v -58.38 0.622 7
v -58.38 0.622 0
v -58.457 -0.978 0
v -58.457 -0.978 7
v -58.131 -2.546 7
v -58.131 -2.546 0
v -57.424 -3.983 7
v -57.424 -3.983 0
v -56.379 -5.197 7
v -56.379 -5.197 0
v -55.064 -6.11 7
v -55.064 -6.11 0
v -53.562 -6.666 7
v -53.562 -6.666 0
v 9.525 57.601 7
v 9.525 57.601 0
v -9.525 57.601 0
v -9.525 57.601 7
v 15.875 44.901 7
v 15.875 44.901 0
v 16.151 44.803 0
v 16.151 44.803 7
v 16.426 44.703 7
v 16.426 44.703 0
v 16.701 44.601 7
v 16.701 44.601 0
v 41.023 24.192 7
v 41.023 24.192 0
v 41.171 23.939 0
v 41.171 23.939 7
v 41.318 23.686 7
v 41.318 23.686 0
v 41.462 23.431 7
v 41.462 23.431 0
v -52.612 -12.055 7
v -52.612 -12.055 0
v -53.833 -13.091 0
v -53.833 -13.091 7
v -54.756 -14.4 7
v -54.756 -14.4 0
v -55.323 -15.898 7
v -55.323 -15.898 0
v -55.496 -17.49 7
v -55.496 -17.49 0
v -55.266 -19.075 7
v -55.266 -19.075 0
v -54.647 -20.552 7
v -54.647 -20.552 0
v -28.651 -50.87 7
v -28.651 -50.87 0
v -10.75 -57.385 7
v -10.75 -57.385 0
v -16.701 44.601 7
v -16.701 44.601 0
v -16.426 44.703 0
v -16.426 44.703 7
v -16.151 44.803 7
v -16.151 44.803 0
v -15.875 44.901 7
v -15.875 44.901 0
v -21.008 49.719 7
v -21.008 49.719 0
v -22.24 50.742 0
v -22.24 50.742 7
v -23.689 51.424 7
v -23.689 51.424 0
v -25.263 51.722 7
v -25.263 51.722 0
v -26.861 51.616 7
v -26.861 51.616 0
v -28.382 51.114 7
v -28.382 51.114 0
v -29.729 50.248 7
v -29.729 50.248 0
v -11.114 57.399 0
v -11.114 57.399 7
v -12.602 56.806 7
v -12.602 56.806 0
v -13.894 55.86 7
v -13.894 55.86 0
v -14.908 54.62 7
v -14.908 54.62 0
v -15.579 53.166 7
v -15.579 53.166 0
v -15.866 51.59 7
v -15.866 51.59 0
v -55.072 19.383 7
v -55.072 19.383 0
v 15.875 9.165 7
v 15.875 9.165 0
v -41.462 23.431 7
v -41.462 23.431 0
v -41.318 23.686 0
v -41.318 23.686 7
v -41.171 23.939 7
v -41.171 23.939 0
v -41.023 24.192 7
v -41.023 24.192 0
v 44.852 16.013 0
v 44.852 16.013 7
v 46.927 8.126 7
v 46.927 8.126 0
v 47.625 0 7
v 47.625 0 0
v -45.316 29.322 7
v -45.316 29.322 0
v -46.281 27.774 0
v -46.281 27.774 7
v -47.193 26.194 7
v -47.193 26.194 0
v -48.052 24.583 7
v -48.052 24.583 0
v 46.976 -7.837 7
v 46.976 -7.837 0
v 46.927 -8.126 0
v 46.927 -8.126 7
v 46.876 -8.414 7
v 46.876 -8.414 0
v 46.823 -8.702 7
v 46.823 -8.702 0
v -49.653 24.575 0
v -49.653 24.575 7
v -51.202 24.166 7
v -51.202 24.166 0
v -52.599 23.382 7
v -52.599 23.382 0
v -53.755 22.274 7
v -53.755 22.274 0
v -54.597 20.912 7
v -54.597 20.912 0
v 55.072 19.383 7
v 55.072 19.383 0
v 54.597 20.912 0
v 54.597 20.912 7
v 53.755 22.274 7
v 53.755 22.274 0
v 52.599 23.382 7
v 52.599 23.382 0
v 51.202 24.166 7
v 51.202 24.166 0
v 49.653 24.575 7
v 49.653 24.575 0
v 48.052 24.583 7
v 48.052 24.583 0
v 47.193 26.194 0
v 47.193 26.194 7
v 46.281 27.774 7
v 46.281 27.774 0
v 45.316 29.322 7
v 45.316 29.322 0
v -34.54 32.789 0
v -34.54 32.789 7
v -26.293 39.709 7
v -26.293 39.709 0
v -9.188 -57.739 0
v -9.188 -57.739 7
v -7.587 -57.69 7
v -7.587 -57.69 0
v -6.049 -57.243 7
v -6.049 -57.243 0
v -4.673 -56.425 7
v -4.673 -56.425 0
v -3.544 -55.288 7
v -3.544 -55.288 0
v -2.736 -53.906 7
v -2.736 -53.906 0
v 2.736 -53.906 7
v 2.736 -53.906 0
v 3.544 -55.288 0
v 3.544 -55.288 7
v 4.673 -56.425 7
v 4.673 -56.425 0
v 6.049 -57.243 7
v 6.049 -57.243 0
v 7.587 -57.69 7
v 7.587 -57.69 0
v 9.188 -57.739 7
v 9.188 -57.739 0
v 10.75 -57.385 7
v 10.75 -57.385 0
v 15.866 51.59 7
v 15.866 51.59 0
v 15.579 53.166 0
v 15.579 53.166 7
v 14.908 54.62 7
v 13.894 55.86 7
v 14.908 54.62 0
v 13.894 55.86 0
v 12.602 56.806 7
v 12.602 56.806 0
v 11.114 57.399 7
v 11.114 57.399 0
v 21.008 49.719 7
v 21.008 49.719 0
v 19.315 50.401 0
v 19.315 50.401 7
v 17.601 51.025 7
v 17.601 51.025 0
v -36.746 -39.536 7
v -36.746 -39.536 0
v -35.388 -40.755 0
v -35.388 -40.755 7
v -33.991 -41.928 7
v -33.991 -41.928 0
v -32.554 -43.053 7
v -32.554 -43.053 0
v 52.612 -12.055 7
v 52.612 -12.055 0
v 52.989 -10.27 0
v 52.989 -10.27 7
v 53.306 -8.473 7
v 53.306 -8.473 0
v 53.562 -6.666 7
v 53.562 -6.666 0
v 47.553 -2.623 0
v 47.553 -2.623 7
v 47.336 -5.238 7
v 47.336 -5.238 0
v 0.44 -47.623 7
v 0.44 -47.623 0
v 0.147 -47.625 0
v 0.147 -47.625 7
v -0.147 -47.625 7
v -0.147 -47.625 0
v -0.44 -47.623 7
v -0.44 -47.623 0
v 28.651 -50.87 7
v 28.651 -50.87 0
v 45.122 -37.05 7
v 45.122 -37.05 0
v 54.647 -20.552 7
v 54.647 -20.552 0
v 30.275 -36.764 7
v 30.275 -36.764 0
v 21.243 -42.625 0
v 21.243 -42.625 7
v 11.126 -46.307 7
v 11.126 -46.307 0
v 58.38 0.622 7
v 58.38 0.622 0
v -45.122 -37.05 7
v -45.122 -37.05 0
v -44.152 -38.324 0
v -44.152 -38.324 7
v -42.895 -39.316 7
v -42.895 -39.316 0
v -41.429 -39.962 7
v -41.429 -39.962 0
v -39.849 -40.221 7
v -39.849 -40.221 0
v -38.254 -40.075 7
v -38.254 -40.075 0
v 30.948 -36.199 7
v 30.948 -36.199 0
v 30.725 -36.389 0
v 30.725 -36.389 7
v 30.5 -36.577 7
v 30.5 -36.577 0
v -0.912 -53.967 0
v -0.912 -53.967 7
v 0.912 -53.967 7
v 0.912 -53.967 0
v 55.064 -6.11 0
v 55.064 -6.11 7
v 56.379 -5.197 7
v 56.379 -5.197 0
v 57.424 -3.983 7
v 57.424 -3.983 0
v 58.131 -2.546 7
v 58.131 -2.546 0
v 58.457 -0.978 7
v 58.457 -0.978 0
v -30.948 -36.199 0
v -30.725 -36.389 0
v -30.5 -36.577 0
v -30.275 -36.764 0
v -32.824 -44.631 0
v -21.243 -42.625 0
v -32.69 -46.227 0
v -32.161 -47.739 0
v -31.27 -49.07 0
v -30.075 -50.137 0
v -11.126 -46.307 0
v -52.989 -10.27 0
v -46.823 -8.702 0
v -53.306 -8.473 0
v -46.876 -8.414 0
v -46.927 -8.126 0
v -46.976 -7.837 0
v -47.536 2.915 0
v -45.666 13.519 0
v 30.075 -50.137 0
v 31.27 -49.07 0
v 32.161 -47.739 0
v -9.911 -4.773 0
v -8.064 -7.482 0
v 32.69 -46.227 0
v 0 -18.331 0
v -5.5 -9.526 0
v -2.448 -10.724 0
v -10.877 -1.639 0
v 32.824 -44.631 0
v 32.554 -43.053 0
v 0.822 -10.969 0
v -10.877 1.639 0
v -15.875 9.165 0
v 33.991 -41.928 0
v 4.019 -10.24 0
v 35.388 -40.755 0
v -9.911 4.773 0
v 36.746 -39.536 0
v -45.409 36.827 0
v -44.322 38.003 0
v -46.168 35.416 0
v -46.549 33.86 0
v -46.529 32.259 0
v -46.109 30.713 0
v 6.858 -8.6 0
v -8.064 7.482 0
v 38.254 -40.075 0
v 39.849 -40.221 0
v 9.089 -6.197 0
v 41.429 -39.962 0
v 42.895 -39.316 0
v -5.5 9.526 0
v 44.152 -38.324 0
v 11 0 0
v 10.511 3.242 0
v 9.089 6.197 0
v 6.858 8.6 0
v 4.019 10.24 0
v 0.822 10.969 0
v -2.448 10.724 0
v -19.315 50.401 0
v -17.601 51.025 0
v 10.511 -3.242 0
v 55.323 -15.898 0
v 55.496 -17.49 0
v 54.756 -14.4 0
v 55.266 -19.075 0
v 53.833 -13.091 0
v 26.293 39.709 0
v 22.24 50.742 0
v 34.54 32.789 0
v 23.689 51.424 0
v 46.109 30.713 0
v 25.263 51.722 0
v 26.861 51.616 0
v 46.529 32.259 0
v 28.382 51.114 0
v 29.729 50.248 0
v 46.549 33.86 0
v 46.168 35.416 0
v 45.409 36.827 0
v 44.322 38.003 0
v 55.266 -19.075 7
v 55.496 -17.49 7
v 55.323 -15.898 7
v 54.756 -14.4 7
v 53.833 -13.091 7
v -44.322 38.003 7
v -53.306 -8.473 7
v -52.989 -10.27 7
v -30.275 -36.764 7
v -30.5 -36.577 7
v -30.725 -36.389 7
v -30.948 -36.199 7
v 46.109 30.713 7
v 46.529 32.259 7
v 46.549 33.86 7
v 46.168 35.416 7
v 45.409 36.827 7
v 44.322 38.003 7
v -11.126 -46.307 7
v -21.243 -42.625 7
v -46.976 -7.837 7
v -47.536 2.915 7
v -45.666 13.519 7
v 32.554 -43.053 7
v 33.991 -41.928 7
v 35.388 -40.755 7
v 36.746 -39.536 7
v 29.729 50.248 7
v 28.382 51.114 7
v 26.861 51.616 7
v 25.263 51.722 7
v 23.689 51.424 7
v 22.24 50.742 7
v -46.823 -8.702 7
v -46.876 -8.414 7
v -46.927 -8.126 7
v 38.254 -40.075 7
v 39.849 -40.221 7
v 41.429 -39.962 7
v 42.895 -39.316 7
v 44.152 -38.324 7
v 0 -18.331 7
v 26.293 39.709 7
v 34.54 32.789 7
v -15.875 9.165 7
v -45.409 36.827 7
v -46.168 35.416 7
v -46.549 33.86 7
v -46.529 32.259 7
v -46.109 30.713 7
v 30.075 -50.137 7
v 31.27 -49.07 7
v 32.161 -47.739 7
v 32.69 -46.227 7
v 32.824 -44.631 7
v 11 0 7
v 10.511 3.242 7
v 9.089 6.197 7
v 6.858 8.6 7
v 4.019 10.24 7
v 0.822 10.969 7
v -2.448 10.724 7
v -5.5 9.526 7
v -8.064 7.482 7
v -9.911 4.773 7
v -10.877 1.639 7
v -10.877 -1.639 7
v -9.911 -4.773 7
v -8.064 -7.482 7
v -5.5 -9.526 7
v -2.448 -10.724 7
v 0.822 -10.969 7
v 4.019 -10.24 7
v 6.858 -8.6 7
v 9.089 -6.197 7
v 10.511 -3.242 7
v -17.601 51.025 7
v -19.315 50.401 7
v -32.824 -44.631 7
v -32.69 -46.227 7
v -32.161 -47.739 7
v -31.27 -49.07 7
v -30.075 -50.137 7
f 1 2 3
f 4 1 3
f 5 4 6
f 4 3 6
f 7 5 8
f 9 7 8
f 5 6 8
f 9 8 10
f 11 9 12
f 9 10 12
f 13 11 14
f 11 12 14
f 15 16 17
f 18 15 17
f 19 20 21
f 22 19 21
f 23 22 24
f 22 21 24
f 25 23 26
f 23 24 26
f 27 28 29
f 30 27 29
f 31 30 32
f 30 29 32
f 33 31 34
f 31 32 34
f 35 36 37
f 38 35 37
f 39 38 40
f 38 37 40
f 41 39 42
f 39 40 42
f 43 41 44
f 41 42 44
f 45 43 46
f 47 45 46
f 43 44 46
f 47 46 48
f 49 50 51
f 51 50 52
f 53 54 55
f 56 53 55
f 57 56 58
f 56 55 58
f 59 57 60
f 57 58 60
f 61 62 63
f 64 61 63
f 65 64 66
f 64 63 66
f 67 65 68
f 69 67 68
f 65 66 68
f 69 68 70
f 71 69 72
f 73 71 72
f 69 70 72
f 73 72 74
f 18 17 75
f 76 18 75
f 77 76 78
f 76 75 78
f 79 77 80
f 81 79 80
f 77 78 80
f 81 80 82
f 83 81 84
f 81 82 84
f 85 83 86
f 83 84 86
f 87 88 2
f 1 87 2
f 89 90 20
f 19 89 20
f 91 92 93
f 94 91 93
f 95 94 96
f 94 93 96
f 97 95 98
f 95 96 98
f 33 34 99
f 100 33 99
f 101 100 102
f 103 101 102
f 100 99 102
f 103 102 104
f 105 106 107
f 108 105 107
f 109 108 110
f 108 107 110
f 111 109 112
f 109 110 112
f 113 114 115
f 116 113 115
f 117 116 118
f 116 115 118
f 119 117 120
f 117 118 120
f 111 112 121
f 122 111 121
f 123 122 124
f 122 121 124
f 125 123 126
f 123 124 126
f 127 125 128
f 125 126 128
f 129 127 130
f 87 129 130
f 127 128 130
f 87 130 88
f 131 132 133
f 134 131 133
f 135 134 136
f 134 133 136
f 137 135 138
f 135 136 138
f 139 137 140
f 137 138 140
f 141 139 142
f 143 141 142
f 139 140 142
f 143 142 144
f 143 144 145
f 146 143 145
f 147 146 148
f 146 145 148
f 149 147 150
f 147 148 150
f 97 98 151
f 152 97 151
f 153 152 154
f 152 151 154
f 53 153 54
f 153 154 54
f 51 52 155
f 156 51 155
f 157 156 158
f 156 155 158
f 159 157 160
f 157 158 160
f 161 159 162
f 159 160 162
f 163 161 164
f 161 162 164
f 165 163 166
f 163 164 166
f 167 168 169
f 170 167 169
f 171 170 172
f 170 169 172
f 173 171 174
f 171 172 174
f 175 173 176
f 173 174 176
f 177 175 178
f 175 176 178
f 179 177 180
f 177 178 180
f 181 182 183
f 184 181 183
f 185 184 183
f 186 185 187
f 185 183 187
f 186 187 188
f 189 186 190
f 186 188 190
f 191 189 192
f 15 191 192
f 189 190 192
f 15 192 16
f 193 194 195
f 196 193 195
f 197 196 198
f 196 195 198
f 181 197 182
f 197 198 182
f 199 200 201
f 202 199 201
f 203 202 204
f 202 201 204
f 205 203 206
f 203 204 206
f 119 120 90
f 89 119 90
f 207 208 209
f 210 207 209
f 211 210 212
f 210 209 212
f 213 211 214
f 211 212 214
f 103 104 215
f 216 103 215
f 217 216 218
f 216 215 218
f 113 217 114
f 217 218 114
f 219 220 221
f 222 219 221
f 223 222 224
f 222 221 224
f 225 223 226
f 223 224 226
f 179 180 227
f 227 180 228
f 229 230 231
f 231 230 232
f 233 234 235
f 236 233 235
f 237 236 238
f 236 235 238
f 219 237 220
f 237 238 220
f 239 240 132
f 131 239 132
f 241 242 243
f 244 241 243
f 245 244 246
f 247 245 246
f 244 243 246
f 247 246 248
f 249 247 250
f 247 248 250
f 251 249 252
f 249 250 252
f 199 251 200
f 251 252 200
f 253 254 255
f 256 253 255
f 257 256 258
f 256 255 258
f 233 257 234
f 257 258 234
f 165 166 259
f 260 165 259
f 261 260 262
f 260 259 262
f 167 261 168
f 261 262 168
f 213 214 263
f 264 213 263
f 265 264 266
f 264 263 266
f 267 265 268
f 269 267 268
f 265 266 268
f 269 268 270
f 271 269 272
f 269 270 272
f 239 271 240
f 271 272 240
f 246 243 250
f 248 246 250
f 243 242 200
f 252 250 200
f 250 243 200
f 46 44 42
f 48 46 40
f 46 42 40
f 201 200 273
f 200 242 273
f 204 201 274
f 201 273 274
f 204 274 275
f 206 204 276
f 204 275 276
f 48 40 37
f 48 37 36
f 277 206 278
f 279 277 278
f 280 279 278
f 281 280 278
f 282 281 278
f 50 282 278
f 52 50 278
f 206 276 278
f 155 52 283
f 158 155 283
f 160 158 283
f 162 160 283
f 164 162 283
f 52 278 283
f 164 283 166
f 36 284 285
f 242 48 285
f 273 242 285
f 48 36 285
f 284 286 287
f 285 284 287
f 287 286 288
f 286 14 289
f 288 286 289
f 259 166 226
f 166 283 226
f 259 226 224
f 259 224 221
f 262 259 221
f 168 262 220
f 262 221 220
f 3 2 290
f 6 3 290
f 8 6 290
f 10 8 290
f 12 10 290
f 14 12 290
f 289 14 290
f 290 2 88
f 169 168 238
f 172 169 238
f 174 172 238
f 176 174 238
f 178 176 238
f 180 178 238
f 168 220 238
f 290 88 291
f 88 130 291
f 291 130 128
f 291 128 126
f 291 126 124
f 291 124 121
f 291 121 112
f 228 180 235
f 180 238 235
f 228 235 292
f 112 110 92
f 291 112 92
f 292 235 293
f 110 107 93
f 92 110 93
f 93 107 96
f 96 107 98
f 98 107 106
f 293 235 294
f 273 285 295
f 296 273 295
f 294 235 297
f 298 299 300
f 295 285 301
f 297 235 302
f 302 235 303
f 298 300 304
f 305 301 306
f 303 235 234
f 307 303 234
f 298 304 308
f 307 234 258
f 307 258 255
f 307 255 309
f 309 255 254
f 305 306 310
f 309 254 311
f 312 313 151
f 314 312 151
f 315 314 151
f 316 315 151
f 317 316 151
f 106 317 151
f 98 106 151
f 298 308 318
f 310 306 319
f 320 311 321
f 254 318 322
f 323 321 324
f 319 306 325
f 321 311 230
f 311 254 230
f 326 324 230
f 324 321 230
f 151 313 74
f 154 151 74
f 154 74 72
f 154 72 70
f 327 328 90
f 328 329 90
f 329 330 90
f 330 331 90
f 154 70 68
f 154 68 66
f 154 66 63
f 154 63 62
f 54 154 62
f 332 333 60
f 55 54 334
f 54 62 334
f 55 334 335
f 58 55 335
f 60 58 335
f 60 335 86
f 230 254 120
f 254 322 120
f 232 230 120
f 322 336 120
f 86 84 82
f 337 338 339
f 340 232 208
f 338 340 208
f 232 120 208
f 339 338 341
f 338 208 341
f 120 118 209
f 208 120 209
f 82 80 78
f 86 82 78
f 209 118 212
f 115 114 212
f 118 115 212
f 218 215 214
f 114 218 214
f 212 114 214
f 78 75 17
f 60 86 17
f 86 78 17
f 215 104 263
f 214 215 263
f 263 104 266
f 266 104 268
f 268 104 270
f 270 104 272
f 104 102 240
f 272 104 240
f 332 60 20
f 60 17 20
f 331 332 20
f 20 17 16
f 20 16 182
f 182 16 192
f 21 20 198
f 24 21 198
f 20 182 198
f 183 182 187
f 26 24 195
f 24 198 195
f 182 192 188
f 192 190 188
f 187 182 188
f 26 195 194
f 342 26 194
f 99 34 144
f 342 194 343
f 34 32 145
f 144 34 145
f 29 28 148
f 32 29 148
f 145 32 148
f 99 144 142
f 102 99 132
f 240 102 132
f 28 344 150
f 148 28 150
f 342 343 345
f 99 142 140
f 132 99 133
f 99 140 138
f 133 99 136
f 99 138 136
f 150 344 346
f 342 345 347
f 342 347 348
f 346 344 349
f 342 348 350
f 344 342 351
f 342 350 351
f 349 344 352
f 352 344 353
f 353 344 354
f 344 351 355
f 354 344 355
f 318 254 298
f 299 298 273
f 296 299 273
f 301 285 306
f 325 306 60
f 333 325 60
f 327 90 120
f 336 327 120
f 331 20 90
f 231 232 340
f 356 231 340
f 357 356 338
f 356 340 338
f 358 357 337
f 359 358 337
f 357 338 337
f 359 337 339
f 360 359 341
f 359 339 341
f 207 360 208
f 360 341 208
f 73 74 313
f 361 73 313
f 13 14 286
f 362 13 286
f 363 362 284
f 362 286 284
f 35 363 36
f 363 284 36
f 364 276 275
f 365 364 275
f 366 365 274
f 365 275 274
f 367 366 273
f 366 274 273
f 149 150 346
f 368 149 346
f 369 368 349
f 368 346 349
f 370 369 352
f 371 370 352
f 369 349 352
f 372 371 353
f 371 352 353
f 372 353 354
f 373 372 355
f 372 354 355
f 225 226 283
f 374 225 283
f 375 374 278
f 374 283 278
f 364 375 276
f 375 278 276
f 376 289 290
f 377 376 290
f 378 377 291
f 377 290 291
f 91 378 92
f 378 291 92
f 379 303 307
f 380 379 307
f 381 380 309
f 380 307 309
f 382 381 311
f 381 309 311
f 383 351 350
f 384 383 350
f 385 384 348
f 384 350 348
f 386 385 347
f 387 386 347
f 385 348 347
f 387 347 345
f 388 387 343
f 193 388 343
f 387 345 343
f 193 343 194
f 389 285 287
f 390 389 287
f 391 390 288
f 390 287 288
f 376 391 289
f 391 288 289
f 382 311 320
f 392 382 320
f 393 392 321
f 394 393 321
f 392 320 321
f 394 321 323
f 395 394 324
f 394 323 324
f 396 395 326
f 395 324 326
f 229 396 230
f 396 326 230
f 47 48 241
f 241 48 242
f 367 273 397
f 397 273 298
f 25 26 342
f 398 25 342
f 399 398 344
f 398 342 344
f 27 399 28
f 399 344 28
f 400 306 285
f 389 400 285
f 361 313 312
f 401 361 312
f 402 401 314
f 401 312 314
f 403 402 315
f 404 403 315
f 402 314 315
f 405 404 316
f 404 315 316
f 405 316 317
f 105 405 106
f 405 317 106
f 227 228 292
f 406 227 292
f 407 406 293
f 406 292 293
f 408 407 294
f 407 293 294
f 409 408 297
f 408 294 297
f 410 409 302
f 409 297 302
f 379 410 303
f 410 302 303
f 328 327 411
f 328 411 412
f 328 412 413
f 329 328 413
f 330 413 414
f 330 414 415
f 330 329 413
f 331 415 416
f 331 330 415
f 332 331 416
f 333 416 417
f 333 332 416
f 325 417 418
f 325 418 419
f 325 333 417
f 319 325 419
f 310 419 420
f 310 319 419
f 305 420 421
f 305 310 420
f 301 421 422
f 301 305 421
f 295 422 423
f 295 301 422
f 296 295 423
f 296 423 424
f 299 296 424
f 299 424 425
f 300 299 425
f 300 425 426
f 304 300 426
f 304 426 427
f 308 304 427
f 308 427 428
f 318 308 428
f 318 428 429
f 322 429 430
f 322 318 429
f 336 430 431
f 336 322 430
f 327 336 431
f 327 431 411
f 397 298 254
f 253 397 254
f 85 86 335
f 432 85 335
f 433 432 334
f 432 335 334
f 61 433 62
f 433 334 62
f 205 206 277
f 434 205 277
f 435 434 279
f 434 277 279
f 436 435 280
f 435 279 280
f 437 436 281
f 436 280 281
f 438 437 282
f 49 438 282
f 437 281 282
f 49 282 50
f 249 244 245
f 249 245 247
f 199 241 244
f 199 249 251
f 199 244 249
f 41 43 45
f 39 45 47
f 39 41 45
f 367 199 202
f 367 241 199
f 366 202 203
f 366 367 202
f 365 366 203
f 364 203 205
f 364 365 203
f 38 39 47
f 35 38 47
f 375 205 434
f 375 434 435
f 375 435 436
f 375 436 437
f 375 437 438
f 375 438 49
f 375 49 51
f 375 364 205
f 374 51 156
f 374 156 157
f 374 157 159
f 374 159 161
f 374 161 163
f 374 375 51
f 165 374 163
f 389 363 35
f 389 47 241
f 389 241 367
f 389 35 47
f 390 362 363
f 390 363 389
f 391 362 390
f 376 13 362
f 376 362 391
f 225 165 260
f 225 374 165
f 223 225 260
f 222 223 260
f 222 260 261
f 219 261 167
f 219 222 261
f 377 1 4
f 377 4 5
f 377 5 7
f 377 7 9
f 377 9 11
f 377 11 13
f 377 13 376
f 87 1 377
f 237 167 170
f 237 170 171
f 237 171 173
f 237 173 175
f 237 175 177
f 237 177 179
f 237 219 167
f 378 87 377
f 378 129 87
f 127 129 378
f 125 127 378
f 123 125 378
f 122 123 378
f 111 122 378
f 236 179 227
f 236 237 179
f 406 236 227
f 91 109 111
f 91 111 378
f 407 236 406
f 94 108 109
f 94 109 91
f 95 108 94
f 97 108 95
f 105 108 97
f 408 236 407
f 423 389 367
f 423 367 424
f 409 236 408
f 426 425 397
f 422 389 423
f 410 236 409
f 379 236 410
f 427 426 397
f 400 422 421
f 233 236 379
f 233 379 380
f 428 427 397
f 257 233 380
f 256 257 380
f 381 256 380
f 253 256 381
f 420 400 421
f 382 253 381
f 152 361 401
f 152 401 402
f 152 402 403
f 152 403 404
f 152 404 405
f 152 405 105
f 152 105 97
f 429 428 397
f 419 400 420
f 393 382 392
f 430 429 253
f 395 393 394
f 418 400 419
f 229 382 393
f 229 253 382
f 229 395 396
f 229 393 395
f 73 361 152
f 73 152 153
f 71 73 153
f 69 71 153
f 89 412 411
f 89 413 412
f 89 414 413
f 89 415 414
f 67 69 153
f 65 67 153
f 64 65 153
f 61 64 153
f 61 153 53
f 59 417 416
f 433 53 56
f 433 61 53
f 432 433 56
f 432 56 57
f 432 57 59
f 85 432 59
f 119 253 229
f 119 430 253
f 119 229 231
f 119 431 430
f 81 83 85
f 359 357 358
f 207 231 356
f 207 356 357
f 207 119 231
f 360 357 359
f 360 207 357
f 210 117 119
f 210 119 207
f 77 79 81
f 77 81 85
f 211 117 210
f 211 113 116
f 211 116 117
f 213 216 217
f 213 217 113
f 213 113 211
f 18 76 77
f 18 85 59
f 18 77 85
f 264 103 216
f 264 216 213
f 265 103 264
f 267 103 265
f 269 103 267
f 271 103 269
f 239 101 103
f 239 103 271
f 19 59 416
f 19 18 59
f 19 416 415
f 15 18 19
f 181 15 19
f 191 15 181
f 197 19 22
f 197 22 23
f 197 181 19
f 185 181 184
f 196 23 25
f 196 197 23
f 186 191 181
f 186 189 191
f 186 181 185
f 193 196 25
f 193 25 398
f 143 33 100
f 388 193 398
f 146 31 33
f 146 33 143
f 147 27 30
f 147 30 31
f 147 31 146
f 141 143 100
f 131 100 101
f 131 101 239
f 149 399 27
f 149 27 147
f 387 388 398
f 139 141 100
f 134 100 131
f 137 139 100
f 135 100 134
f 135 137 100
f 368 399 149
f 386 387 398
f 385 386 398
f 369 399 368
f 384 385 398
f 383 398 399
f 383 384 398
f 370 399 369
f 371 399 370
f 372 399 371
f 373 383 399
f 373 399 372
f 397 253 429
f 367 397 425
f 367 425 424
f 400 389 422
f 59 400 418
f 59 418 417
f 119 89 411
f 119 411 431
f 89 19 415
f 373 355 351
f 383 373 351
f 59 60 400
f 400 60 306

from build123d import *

# Parameters (mm, degrees)
F0_R     = 15.875
F0_R_2   = 11
F1_DEPTH = 7


with BuildPart() as f1:
    # F0 (on Top) → F1 (new body)
    with BuildSketch(Plane.XY):
        with BuildLine():
            ThreePointArc((41.4624644399, 23.4308486311), (46.0586066547, 12.1138506688), (47.625, 0))
            ThreePointArc((47.625, 0), (47.4624210197, -3.931820946), (46.9757940808, -7.836797527))
            Line((46.9757940808, -7.836797527), (53.2293233124, -6.7341315989))
            ThreePointArc((53.2293233124, -6.7341315989), (53.3959889037, -6.7024427295), (53.5617484649, -6.6663128026))
            ThreePointArc((53.5617484649, -6.6663128026), (53.8715880516, -3.3395547313), (53.975, 0))
            ThreePointArc((53.975, 0), (52.4732499869, 12.6435224842), (48.0515665287, 24.5834818352))
            ThreePointArc((48.0515665287, 24.5834818352), (47.8834463294, 24.560739752), (47.7159936715, 24.5335145593))
            Line((47.7159936715, 24.5335145593), (41.4624644399, 23.4308486311))
        make_face()
        with BuildLine():
            ThreePointArc((41.0229423667, 24.1921231929), (41.2444598552, 23.8125), (41.4624644399, 23.4308486311))
            Line((41.4624644399, 23.4308486311), (47.7159936715, 24.5335145593))
            ThreePointArc((47.7159936715, 24.5335145593), (47.8834463294, 24.560739752), (48.0515665287, 24.5834818352))
            ThreePointArc((48.0515665287, 24.5834818352), (46.7437211693, 26.9875), (45.3157030471, 29.3221363879))
            ThreePointArc((45.3157030471, 29.3221363879), (45.2119477257, 29.187911066), (45.1046436882, 29.0565054067))
            Line((45.1046436882, 29.0565054067), (41.0229423667, 24.1921231929))
        make_face()
        with BuildLine():
            Line((53.2293233124, -6.7341315989), (46.9757940808, -7.836797527))
            ThreePointArc((46.9757940808, -7.836797527), (46.9014692372, -8.2699944614), (46.8231496667, -8.7024870176))
            Line((46.8231496667, -8.7024870176), (52.3224109807, -11.8774870176))
            ThreePointArc((52.3224109807, -11.8774870176), (52.4681871753, -11.9642678037), (52.6115930491, -12.0549119383))
            ThreePointArc((52.6115930491, -12.0549119383), (53.1549984688, -9.3726603896), (53.5617484649, -6.6663128026))
            ThreePointArc((53.5617484649, -6.6663128026), (53.3959889037, -6.7024427295), (53.2293233124, -6.7341315989))
        make_face()
        with BuildLine():
            ThreePointArc((16.7010312977, 44.6006298004), (30.6127599113, 36.4828666035), (41.0229423667, 24.1921231929))
            Line((41.0229423667, 24.1921231929), (45.1046436882, 29.0565054067))
            ThreePointArc((45.1046436882, 29.0565054067), (45.2119477257, 29.187911066), (45.3157030471, 29.3221363879))
            ThreePointArc((45.3157030471, 29.3221363879), (34.6944612328, 41.3472488173), (21.0076779958, 49.718991243))
            ThreePointArc((21.0076779958, 49.718991243), (20.8935087807, 49.5935042155), (20.7827326192, 49.4650120142))
            Line((20.7827326192, 49.4650120142), (16.7010312977, 44.6006298004))
        make_face()
        with BuildLine():
            Line((52.3224109807, -11.8774870176), (46.8231496667, -8.7024870176))
            ThreePointArc((46.8231496667, -8.7024870176), (41.2444598552, -23.8125), (30.9481496667, -36.1987935878))
            Line((30.9481496667, -36.1987935878), (36.4474109807, -39.3737935878))
            ThreePointArc((36.4474109807, -39.3737935878), (36.5954534434, -39.4566490825), (36.7456565035, -39.5355201449))
            ThreePointArc((36.7456565035, -39.5355201449), (46.7437211693, -26.9875), (52.6115930491, -12.0549119383))
            ThreePointArc((52.6115930491, -12.0549119383), (52.4681871753, -11.9642678037), (52.3224109807, -11.8774870176))
        make_face()
        with BuildLine():
            ThreePointArc((15.875, 44.9012806053), (16.2887093259, 44.7528610649), (16.7010312977, 44.6006298004))
            Line((16.7010312977, 44.6006298004), (20.7827326192, 49.4650120142))
            ThreePointArc((20.7827326192, 49.4650120142), (20.8935087807, 49.5935042155), (21.0076779958, 49.718991243))
            ThreePointArc((21.0076779958, 49.718991243), (18.460537236, 50.7199092069), (15.8659365456, 51.5904320832))
            ThreePointArc((15.8659365456, 51.5904320832), (15.872733732, 51.4209168862), (15.875, 51.2512806053))
            Line((15.875, 51.2512806053), (15.875, 44.9012806053))
        make_face()
        with BuildLine():
            ThreePointArc((55.0721888313, 19.3826512558), (52.5985279988, 23.3824450174), (48.0515665287, 24.5834818352))
            ThreePointArc((48.0515665287, 24.5834818352), (52.4732499869, 12.6435224842), (53.975, 0))
            ThreePointArc((53.975, 0), (53.8715880516, -3.3395547313), (53.5617484649, -6.6663128026))
            ThreePointArc((53.5617484649, -6.6663128026), (57.4237158208, -3.9825549539), (58.3801866159, 0.622063561))
            Line((58.3801866159, 0.622063561), (55.0721888313, 19.3826512558))
        make_face()
        with BuildLine():
            Line((36.4474109807, -39.3737935878), (30.9481496667, -36.1987935878))
            ThreePointArc((30.9481496667, -36.1987935878), (30.6127599113, -36.4828666035), (30.2747627831, -36.7638322734))
            Line((30.2747627831, -36.7638322734), (32.4465906932, -42.7308804154))
            ThreePointArc((32.4465906932, -42.7308804154), (32.502480123, -42.891061486), (32.5540704691, -43.0526784404))
            ThreePointArc((32.5540704691, -43.0526784404), (34.6944612328, -41.3472488173), (36.7456565035, -39.5355201449))
            ThreePointArc((36.7456565035, -39.5355201449), (36.5954534434, -39.4566490825), (36.4474109807, -39.3737935878))
        make_face()
        with BuildLine():
            ThreePointArc((-15.875, 44.9012806053), (0, 47.625), (15.875, 44.9012806053))
            Line((15.875, 44.9012806053), (15.875, 51.2512806053))
            ThreePointArc((15.875, 51.2512806053), (15.872733732, 51.4209168862), (15.8659365456, 51.5904320832))
            ThreePointArc((15.8659365456, 51.5904320832), (0, 53.975), (-15.8659365456, 51.5904320832))
            ThreePointArc((-15.8659365456, 51.5904320832), (-15.872733732, 51.4209168862), (-15.875, 51.2512806053))
            Line((-15.875, 51.2512806053), (-15.875, 44.9012806053))
        make_face()
        with BuildLine():
            ThreePointArc((21.0076779958, 49.718991243), (34.6944612328, 41.3472488173), (45.3157030471, 29.3221363879))
            ThreePointArc((45.3157030471, 29.3221363879), (46.549055387, 33.86043894), (44.3219627959, 38.002588942))
            Line((44.3219627959, 38.002588942), (29.7288161545, 50.2476929065))
            ThreePointArc((29.7288161545, 50.2476929065), (25.2628641484, 51.7216741575), (21.0076779958, 49.718991243))
        make_face()
        with BuildLine():
            Line((32.4465906932, -42.7308804154), (30.2747627831, -36.7638322734))
            ThreePointArc((30.2747627831, -36.7638322734), (16.2887093259, -44.7528610649), (0.4395220732, -47.622971824))
            Line((0.4395220732, -47.622971824), (2.6113499833, -53.590019966))
            ThreePointArc((2.6113499833, -53.590019966), (2.6714986037, -53.748650818), (2.7358634816, -53.9056182231))
            ThreePointArc((2.7358634816, -53.9056182231), (18.460537236, -50.7199092069), (32.5540704691, -43.0526784404))
            ThreePointArc((32.5540704691, -43.0526784404), (32.502480123, -42.891061486), (32.4465906932, -42.7308804154))
        make_face()
        with BuildLine():
            ThreePointArc((54.6466722947, -20.5517483316), (55.3227560311, -15.8976900133), (52.6115930491, -12.0549119383))
            ThreePointArc((52.6115930491, -12.0549119383), (46.7437211693, -26.9875), (36.7456565035, -39.5355201449))
            ThreePointArc((36.7456565035, -39.5355201449), (41.4291814286, -39.9620671236), (45.1216722947, -37.0495322737))
            Line((45.1216722947, -37.0495322737), (54.6466722947, -20.5517483316))
        make_face()
        with BuildLine():
            ThreePointArc((-16.7010312977, 44.6006298004), (-16.2887093259, 44.7528610649), (-15.875, 44.9012806053))
            Line((-15.875, 44.9012806053), (-15.875, 51.2512806053))
            ThreePointArc((-15.875, 51.2512806053), (-15.872733732, 51.4209168862), (-15.8659365456, 51.5904320832))
            ThreePointArc((-15.8659365456, 51.5904320832), (-18.460537236, 50.7199092069), (-21.0076779958, 49.718991243))
            ThreePointArc((-21.0076779958, 49.718991243), (-20.8935087807, 49.5935042155), (-20.7827326192, 49.4650120142))
            Line((-20.7827326192, 49.4650120142), (-16.7010312977, 44.6006298004))
        make_face()
        with BuildLine():
            Line((2.6113499833, -53.590019966), (0.4395220732, -47.622971824))
            ThreePointArc((0.4395220732, -47.622971824), (0, -47.625), (-0.4395220732, -47.622971824))
            Line((-0.4395220732, -47.622971824), (-2.6113499833, -53.590019966))
            ThreePointArc((-2.6113499833, -53.590019966), (-2.6714986037, -53.748650818), (-2.7358634816, -53.9056182231))
            ThreePointArc((-2.7358634816, -53.9056182231), (0, -53.975), (2.7358634816, -53.9056182231))
            ThreePointArc((2.7358634816, -53.9056182231), (2.6714986037, -53.748650818), (2.6113499833, -53.590019966))
        make_face()
        with BuildLine():
            Line((-36.4474109807, -39.3737935878), (-30.9481496667, -36.1987935878))
            ThreePointArc((-30.9481496667, -36.1987935878), (-41.2444598552, -23.8125), (-46.8231496667, -8.7024870176))
            Line((-46.8231496667, -8.7024870176), (-52.3224109807, -11.8774870176))
            ThreePointArc((-52.3224109807, -11.8774870176), (-52.4681871753, -11.9642678037), (-52.6115930491, -12.0549119383))
            ThreePointArc((-52.6115930491, -12.0549119383), (-46.7437211693, -26.9875), (-36.7456565035, -39.5355201449))
            ThreePointArc((-36.7456565035, -39.5355201449), (-36.5954534434, -39.4566490825), (-36.4474109807, -39.3737935878))
        make_face()
        with BuildLine():
            ThreePointArc((-30.2747627831, -36.7638322734), (-30.6127599113, -36.4828666035), (-30.9481496667, -36.1987935878))
            Line((-30.9481496667, -36.1987935878), (-36.4474109807, -39.3737935878))
            ThreePointArc((-36.4474109807, -39.3737935878), (-36.5954534434, -39.4566490825), (-36.7456565035, -39.5355201449))
            ThreePointArc((-36.7456565035, -39.5355201449), (-34.6944612328, -41.3472488173), (-32.5540704691, -43.0526784404))
            ThreePointArc((-32.5540704691, -43.0526784404), (-32.502480123, -42.891061486), (-32.4465906932, -42.7308804154))
            Line((-32.4465906932, -42.7308804154), (-30.2747627831, -36.7638322734))
        make_face()
        with BuildLine():
            ThreePointArc((-41.0229423667, 24.1921231929), (-30.6127599113, 36.4828666035), (-16.7010312977, 44.6006298004))
            Line((-16.7010312977, 44.6006298004), (-20.7827326192, 49.4650120142))
            ThreePointArc((-20.7827326192, 49.4650120142), (-20.8935087807, 49.5935042155), (-21.0076779958, 49.718991243))
            ThreePointArc((-21.0076779958, 49.718991243), (-34.6944612328, 41.3472488173), (-45.3157030471, 29.3221363879))
            ThreePointArc((-45.3157030471, 29.3221363879), (-45.2119477257, 29.187911066), (-45.1046436882, 29.0565054067))
            Line((-45.1046436882, 29.0565054067), (-41.0229423667, 24.1921231929))
        make_face()
        with BuildLine():
            ThreePointArc((-15.8659365456, 51.5904320832), (0, 53.975), (15.8659365456, 51.5904320832))
            ThreePointArc((15.8659365456, 51.5904320832), (13.8935746025, 55.8597571369), (9.525, 57.6012806053))
            Line((9.525, 57.6012806053), (-9.525, 57.6012806053))
            ThreePointArc((-9.525, 57.6012806053), (-13.8935746025, 55.8597571369), (-15.8659365456, 51.5904320832))
        make_face()
        with BuildLine():
            Line((-2.6113499833, -53.590019966), (-0.4395220732, -47.622971824))
            ThreePointArc((-0.4395220732, -47.622971824), (-16.2887093259, -44.7528610649), (-30.2747627831, -36.7638322734))
            Line((-30.2747627831, -36.7638322734), (-32.4465906932, -42.7308804154))
            ThreePointArc((-32.4465906932, -42.7308804154), (-32.502480123, -42.891061486), (-32.5540704691, -43.0526784404))
            ThreePointArc((-32.5540704691, -43.0526784404), (-18.460537236, -50.7199092069), (-2.7358634816, -53.9056182231))
            ThreePointArc((-2.7358634816, -53.9056182231), (-2.6714986037, -53.748650818), (-2.6113499833, -53.590019966))
        make_face()
        with BuildLine():
            ThreePointArc((28.6513704614, -50.8697564675), (32.1608516724, -47.7391192036), (32.5540704691, -43.0526784404))
            ThreePointArc((32.5540704691, -43.0526784404), (18.460537236, -50.7199092069), (2.7358634816, -53.9056182231))
            ThreePointArc((2.7358634816, -53.9056182231), (6.0494726118, -57.2428839573), (10.7502260354, -57.3852401978))
            Line((10.7502260354, -57.3852401978), (28.6513704614, -50.8697564675))
        make_face()
        with BuildLine():
            Line((-52.3224109807, -11.8774870176), (-46.8231496667, -8.7024870176))
            ThreePointArc((-46.8231496667, -8.7024870176), (-46.9014692372, -8.2699944614), (-46.9757940808, -7.836797527))
            Line((-46.9757940808, -7.836797527), (-53.2293233124, -6.7341315989))
            ThreePointArc((-53.2293233124, -6.7341315989), (-53.3959889037, -6.7024427295), (-53.5617484649, -6.6663128026))
            ThreePointArc((-53.5617484649, -6.6663128026), (-53.1549984688, -9.3726603896), (-52.6115930491, -12.0549119383))
            ThreePointArc((-52.6115930491, -12.0549119383), (-52.4681871753, -11.9642678037), (-52.3224109807, -11.8774870176))
        make_face()
        with BuildLine():
            ThreePointArc((-41.4624644399, 23.4308486311), (-41.2444598552, 23.8125), (-41.0229423667, 24.1921231929))
            Line((-41.0229423667, 24.1921231929), (-45.1046436882, 29.0565054067))
            ThreePointArc((-45.1046436882, 29.0565054067), (-45.2119477257, 29.187911066), (-45.3157030471, 29.3221363879))
            ThreePointArc((-45.3157030471, 29.3221363879), (-46.7437211693, 26.9875), (-48.0515665287, 24.5834818352))
            ThreePointArc((-48.0515665287, 24.5834818352), (-47.8834463294, 24.560739752), (-47.7159936715, 24.5335145593))
            Line((-47.7159936715, 24.5335145593), (-41.4624644399, 23.4308486311))
        make_face()
        with BuildLine():
            Line((-53.2293233124, -6.7341315989), (-46.9757940808, -7.836797527))
            ThreePointArc((-46.9757940808, -7.836797527), (-46.9014692372, 8.2699944614), (-41.4624644399, 23.4308486311))
            Line((-41.4624644399, 23.4308486311), (-47.7159936715, 24.5335145593))
            ThreePointArc((-47.7159936715, 24.5335145593), (-47.8834463294, 24.560739752), (-48.0515665287, 24.5834818352))
            ThreePointArc((-48.0515665287, 24.5834818352), (-53.1549984688, 9.3726603896), (-53.5617484649, -6.6663128026))
            ThreePointArc((-53.5617484649, -6.6663128026), (-53.3959889037, -6.7024427295), (-53.2293233124, -6.7341315989))
        make_face()
        with BuildLine():
            ThreePointArc((-45.1216722947, -37.0495322737), (-41.4291814286, -39.9620671236), (-36.7456565035, -39.5355201449))
            ThreePointArc((-36.7456565035, -39.5355201449), (-46.7437211693, -26.9875), (-52.6115930491, -12.0549119383))
            ThreePointArc((-52.6115930491, -12.0549119383), (-55.3227560311, -15.8976900133), (-54.6466722947, -20.5517483316))
            Line((-54.6466722947, -20.5517483316), (-45.1216722947, -37.0495322737))
        make_face()
        with BuildLine():
            ThreePointArc((-45.3157030471, 29.3221363879), (-34.6944612328, 41.3472488173), (-21.0076779958, 49.718991243))
            ThreePointArc((-21.0076779958, 49.718991243), (-25.2628641484, 51.7216741575), (-29.7288161545, 50.2476929065))
            Line((-29.7288161545, 50.2476929065), (-44.3219627959, 38.002588942))
            ThreePointArc((-44.3219627959, 38.002588942), (-46.549055387, 33.86043894), (-45.3157030471, 29.3221363879))
        make_face()
        with BuildLine():
            ThreePointArc((-10.7502260354, -57.3852401978), (-6.0494726118, -57.2428839573), (-2.7358634816, -53.9056182231))
            ThreePointArc((-2.7358634816, -53.9056182231), (-18.460537236, -50.7199092069), (-32.5540704691, -43.0526784404))
            ThreePointArc((-32.5540704691, -43.0526784404), (-32.1608516724, -47.7391192036), (-28.6513704614, -50.8697564675))
            Line((-28.6513704614, -50.8697564675), (-10.7502260354, -57.3852401978))
        make_face()
        with BuildLine():
            ThreePointArc((-58.3801866159, 0.622063561), (-57.4237158208, -3.9825549539), (-53.5617484649, -6.6663128026))
            ThreePointArc((-53.5617484649, -6.6663128026), (-53.1549984688, 9.3726603896), (-48.0515665287, 24.5834818352))
            ThreePointArc((-48.0515665287, 24.5834818352), (-52.5985279988, 23.3824450174), (-55.0721888313, 19.3826512558))
            Line((-55.0721888313, 19.3826512558), (-58.3801866159, 0.622063561))
        make_face()
        Polygon((30.9481496667, -36.1987935878), (46.8231496667, -8.7024870176), (15.875, 9.1654355234), (15.875, 44.9012806053), (-15.875, 44.9012806053), (-15.875, 9.1654355234), (-46.8231496667, -8.7024870176), (-30.9481496667, -36.1987935878), (0, -18.3308710468), align=None)
        Circle(F0_R, mode=Mode.SUBTRACT)
        Circle(F0_R)
        Circle(F0_R_2, mode=Mode.SUBTRACT)
        with BuildLine():
            Line((-15.875, 44.9012806053), (15.875, 44.9012806053))
            ThreePointArc((15.875, 44.9012806053), (0, 47.625), (-15.875, 44.9012806053))
        make_face()
        with BuildLine():
            ThreePointArc((-46.8231496667, -8.7024870176), (-41.2444598552, -23.8125), (-30.9481496667, -36.1987935878))
            Line((-30.9481496667, -36.1987935878), (-46.8231496667, -8.7024870176))
        make_face()
        with BuildLine():
            ThreePointArc((30.9481496667, -36.1987935878), (41.2444598552, -23.8125), (46.8231496667, -8.7024870176))
            Line((46.8231496667, -8.7024870176), (30.9481496667, -36.1987935878))
        make_face()
    extrude(amount=F1_DEPTH)


solid = f1.part
